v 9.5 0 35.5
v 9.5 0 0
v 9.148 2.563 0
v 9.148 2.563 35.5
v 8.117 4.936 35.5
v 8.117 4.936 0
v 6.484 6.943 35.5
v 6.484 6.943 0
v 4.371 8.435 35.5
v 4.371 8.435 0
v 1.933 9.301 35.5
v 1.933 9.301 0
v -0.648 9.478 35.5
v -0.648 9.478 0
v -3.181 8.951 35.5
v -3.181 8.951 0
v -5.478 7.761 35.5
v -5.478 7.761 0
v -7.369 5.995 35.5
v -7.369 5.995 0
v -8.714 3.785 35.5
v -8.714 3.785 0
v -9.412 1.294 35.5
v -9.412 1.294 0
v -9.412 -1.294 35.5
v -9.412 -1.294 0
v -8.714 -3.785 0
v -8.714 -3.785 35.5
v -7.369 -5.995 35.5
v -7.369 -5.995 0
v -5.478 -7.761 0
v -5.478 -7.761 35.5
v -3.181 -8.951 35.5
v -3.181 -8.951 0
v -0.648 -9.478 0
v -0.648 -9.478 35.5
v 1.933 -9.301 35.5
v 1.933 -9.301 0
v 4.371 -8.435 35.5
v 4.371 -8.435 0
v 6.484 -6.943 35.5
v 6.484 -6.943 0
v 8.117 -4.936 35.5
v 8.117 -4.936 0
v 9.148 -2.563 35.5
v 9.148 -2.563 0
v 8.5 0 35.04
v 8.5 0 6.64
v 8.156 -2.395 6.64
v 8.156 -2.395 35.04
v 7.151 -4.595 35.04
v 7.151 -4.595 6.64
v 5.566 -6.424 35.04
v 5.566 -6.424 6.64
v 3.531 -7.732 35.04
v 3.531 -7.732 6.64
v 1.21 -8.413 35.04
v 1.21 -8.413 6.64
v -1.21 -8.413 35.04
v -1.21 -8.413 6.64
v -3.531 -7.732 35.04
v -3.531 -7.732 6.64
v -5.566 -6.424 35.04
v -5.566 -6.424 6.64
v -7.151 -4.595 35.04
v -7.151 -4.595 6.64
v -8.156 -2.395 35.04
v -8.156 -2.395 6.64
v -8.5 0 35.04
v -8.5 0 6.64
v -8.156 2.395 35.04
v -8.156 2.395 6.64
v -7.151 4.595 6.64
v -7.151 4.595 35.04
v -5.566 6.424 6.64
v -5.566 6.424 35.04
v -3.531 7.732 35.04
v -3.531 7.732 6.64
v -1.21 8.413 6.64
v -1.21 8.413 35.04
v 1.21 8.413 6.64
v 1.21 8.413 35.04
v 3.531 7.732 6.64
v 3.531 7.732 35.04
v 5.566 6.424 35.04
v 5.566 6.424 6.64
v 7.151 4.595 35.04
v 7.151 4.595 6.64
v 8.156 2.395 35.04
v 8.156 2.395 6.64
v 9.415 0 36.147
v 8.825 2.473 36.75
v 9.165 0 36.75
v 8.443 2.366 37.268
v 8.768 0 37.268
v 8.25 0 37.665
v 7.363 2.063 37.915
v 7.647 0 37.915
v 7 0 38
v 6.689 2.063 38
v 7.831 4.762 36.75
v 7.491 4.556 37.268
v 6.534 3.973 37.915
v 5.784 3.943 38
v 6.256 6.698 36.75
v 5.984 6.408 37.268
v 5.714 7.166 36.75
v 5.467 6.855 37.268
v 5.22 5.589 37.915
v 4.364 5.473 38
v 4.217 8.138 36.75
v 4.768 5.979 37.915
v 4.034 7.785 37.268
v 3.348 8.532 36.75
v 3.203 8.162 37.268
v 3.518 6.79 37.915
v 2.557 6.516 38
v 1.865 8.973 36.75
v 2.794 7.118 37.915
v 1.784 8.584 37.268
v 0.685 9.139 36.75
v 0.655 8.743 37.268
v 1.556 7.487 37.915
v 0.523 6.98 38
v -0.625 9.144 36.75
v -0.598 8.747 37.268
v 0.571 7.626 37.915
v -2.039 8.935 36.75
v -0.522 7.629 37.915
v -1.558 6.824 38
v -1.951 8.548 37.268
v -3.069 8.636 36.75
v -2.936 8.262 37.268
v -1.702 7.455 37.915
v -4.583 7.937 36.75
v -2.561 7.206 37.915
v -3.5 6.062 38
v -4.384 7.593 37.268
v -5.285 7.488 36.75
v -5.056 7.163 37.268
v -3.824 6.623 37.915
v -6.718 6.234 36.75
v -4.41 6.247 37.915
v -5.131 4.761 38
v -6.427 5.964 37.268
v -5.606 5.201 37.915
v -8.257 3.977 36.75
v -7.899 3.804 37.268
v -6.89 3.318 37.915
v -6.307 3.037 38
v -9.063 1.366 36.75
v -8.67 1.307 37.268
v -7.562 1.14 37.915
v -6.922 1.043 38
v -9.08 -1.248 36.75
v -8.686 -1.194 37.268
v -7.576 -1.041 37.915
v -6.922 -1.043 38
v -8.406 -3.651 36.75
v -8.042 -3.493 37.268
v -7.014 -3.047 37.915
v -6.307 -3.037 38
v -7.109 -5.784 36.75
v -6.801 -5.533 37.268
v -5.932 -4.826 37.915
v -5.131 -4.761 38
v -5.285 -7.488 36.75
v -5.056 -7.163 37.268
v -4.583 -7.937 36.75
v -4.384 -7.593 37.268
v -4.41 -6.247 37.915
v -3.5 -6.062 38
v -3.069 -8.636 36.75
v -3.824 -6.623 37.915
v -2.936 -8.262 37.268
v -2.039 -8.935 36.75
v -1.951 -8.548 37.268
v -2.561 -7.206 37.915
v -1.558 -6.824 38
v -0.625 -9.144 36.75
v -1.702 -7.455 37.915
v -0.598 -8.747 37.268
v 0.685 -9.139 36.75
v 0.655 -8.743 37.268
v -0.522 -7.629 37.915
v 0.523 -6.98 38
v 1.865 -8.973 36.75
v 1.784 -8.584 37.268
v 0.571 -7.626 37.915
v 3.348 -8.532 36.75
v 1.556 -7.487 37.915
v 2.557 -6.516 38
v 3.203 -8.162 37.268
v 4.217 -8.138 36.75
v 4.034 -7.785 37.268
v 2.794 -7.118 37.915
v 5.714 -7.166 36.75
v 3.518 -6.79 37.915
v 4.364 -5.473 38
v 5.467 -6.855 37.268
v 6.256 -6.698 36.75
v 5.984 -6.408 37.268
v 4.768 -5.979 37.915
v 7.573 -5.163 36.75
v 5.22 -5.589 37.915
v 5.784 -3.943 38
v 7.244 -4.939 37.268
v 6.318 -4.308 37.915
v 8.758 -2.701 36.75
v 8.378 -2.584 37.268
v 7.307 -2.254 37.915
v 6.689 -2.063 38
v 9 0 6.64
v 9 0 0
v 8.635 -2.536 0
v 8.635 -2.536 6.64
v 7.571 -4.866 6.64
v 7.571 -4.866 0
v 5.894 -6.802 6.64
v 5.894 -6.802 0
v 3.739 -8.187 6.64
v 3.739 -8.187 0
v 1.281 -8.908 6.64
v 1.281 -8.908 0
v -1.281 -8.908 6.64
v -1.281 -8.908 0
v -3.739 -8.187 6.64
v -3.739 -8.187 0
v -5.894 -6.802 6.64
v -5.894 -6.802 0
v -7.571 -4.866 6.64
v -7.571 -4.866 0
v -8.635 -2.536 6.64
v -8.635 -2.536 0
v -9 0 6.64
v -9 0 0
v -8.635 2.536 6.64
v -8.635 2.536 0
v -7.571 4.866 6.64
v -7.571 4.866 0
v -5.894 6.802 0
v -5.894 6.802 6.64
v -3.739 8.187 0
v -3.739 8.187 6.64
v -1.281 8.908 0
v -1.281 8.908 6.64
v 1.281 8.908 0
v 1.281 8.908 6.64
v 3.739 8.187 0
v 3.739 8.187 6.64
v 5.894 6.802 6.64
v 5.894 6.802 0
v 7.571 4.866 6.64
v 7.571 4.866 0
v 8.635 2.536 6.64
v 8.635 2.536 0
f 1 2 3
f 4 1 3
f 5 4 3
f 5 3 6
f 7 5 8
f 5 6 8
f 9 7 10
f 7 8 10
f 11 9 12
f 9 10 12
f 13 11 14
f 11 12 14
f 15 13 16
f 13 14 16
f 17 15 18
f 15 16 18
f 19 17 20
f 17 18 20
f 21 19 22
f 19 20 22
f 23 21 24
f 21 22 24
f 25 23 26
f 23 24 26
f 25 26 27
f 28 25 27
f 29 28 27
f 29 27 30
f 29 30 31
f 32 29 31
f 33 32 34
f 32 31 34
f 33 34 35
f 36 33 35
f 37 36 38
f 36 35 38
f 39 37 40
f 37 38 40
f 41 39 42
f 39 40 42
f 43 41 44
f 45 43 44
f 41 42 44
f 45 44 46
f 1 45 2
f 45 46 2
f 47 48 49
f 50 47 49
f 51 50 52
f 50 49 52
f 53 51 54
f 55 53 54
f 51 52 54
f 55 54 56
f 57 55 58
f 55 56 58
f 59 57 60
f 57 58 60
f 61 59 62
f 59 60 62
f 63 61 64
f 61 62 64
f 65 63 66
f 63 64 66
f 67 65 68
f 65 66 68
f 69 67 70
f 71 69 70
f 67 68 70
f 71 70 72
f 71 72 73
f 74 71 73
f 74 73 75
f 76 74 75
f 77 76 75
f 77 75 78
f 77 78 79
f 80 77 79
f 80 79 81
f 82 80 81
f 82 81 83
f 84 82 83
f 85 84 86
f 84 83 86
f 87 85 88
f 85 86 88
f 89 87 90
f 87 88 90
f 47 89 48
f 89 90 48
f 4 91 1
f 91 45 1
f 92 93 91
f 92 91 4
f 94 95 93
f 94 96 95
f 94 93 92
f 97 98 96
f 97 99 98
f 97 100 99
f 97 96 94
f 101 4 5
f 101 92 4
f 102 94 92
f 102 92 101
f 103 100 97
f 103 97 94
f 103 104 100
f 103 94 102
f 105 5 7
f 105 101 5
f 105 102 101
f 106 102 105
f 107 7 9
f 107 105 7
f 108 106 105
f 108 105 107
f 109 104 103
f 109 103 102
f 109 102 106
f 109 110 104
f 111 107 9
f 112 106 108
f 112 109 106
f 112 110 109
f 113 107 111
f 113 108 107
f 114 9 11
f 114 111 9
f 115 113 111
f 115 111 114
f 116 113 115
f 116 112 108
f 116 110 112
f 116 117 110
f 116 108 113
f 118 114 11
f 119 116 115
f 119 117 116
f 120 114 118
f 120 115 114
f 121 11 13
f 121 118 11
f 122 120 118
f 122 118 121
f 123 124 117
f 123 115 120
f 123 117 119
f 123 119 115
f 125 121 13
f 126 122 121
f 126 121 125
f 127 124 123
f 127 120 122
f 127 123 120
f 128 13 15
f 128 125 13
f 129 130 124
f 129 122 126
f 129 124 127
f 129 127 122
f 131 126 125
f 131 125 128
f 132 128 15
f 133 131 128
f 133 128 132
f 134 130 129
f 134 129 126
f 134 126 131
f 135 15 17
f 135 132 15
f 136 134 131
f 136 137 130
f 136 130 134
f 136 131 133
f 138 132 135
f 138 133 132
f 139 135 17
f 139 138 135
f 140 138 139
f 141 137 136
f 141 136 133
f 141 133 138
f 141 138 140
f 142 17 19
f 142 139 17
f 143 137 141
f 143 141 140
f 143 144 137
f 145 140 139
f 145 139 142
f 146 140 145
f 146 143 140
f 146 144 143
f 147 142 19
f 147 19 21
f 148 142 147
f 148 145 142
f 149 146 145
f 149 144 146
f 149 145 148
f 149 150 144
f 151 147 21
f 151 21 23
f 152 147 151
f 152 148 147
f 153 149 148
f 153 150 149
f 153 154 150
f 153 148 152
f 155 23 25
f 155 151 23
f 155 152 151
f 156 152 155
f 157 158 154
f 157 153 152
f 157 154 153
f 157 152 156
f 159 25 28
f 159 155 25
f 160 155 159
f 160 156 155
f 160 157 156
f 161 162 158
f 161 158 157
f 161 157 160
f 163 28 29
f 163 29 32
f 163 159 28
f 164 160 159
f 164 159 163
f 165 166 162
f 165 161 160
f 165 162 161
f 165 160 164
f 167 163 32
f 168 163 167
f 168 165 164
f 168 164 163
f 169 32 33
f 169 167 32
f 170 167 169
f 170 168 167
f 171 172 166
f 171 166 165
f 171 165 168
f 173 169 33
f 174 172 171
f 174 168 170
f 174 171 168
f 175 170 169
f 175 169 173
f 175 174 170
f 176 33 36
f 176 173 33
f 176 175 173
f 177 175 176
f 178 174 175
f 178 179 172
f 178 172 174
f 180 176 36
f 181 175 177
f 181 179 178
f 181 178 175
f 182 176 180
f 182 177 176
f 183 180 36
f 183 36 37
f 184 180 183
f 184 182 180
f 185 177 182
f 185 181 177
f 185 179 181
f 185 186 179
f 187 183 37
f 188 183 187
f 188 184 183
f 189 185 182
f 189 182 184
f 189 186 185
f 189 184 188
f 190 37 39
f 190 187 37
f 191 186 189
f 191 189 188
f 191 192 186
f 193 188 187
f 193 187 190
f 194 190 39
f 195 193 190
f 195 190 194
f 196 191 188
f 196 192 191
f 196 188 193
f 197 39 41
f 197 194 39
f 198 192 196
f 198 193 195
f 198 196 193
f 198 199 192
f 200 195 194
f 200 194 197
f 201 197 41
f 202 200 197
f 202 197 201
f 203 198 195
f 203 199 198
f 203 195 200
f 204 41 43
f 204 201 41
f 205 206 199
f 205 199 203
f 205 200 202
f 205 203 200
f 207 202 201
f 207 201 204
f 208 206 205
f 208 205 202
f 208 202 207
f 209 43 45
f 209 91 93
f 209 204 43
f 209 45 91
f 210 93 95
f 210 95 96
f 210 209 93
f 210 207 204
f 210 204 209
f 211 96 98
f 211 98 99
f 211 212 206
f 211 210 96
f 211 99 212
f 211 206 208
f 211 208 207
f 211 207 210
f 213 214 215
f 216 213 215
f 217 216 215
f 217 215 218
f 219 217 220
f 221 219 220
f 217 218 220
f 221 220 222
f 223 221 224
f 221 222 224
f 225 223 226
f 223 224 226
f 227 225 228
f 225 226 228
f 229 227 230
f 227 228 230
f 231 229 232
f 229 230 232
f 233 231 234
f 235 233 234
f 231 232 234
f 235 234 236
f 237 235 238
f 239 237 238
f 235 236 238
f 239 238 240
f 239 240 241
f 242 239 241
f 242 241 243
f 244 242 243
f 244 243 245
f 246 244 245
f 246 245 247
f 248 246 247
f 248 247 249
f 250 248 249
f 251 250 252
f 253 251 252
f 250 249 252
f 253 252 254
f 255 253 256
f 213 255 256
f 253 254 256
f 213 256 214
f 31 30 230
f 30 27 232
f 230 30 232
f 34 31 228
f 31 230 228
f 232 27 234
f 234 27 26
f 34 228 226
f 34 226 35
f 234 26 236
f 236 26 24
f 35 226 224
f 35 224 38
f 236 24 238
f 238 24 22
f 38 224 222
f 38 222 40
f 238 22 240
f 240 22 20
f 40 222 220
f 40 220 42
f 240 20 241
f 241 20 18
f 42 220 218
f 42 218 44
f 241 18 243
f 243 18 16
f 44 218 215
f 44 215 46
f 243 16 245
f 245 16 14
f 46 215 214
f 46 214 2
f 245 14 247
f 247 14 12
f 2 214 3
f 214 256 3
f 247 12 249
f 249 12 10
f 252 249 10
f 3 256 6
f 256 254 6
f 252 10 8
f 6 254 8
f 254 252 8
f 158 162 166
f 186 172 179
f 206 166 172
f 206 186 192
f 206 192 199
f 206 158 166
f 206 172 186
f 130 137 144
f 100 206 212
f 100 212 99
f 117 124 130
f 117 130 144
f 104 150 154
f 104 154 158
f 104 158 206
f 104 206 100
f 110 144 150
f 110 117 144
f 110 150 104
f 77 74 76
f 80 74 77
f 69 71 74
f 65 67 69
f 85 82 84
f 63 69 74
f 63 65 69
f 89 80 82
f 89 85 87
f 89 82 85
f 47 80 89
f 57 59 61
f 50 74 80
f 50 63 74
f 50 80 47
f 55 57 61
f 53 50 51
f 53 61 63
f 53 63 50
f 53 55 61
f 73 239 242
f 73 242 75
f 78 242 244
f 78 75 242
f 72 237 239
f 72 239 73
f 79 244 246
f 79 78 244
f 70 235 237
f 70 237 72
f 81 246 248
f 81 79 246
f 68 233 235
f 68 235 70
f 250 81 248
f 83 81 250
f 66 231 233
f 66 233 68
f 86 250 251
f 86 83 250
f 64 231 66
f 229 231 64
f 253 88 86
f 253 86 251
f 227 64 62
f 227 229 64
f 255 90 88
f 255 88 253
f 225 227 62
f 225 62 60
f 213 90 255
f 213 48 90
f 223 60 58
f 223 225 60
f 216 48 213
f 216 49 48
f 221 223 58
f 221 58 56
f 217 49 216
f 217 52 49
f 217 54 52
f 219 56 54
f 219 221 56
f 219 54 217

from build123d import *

# Parameters (mm, degrees)
F0_R     = 9.5
F1_DEPTH = 38
F2_R     = 2.5
F3_R     = 9
F4_DEPTH = 6.64
F5_R     = 8.5
F6_DEPTH = 28.4


with BuildPart() as f1:
    # F0 (on Top) → F1 (new body)
    with BuildSketch(Plane.XY):
        Circle(F0_R)
    extrude(amount=F1_DEPTH)

    # F2
    f2_edges = [f1.edges().sort_by_distance(p)[0] for p in [
        (-9.5, 0, 38),
    ]]
    fillet(f2_edges, radius=F2_R)

    # F3 (on face) → F4 (cut)
    with BuildSketch(Plane(origin=(0, 0, 0), x_dir=(1, 0, 0), z_dir=(0, 0, -1))):
        Circle(F3_R)
    extrude(amount=-F4_DEPTH, mode=Mode.SUBTRACT)

    # F5 (on face) → F6 (cut)
    with BuildSketch(Plane(origin=(0, 0, 6.64), x_dir=(1, 0, 0), z_dir=(0, 0, -1))):
        Circle(F5_R)
    extrude(amount=-F6_DEPTH, mode=Mode.SUBTRACT)


solid = f1.part
